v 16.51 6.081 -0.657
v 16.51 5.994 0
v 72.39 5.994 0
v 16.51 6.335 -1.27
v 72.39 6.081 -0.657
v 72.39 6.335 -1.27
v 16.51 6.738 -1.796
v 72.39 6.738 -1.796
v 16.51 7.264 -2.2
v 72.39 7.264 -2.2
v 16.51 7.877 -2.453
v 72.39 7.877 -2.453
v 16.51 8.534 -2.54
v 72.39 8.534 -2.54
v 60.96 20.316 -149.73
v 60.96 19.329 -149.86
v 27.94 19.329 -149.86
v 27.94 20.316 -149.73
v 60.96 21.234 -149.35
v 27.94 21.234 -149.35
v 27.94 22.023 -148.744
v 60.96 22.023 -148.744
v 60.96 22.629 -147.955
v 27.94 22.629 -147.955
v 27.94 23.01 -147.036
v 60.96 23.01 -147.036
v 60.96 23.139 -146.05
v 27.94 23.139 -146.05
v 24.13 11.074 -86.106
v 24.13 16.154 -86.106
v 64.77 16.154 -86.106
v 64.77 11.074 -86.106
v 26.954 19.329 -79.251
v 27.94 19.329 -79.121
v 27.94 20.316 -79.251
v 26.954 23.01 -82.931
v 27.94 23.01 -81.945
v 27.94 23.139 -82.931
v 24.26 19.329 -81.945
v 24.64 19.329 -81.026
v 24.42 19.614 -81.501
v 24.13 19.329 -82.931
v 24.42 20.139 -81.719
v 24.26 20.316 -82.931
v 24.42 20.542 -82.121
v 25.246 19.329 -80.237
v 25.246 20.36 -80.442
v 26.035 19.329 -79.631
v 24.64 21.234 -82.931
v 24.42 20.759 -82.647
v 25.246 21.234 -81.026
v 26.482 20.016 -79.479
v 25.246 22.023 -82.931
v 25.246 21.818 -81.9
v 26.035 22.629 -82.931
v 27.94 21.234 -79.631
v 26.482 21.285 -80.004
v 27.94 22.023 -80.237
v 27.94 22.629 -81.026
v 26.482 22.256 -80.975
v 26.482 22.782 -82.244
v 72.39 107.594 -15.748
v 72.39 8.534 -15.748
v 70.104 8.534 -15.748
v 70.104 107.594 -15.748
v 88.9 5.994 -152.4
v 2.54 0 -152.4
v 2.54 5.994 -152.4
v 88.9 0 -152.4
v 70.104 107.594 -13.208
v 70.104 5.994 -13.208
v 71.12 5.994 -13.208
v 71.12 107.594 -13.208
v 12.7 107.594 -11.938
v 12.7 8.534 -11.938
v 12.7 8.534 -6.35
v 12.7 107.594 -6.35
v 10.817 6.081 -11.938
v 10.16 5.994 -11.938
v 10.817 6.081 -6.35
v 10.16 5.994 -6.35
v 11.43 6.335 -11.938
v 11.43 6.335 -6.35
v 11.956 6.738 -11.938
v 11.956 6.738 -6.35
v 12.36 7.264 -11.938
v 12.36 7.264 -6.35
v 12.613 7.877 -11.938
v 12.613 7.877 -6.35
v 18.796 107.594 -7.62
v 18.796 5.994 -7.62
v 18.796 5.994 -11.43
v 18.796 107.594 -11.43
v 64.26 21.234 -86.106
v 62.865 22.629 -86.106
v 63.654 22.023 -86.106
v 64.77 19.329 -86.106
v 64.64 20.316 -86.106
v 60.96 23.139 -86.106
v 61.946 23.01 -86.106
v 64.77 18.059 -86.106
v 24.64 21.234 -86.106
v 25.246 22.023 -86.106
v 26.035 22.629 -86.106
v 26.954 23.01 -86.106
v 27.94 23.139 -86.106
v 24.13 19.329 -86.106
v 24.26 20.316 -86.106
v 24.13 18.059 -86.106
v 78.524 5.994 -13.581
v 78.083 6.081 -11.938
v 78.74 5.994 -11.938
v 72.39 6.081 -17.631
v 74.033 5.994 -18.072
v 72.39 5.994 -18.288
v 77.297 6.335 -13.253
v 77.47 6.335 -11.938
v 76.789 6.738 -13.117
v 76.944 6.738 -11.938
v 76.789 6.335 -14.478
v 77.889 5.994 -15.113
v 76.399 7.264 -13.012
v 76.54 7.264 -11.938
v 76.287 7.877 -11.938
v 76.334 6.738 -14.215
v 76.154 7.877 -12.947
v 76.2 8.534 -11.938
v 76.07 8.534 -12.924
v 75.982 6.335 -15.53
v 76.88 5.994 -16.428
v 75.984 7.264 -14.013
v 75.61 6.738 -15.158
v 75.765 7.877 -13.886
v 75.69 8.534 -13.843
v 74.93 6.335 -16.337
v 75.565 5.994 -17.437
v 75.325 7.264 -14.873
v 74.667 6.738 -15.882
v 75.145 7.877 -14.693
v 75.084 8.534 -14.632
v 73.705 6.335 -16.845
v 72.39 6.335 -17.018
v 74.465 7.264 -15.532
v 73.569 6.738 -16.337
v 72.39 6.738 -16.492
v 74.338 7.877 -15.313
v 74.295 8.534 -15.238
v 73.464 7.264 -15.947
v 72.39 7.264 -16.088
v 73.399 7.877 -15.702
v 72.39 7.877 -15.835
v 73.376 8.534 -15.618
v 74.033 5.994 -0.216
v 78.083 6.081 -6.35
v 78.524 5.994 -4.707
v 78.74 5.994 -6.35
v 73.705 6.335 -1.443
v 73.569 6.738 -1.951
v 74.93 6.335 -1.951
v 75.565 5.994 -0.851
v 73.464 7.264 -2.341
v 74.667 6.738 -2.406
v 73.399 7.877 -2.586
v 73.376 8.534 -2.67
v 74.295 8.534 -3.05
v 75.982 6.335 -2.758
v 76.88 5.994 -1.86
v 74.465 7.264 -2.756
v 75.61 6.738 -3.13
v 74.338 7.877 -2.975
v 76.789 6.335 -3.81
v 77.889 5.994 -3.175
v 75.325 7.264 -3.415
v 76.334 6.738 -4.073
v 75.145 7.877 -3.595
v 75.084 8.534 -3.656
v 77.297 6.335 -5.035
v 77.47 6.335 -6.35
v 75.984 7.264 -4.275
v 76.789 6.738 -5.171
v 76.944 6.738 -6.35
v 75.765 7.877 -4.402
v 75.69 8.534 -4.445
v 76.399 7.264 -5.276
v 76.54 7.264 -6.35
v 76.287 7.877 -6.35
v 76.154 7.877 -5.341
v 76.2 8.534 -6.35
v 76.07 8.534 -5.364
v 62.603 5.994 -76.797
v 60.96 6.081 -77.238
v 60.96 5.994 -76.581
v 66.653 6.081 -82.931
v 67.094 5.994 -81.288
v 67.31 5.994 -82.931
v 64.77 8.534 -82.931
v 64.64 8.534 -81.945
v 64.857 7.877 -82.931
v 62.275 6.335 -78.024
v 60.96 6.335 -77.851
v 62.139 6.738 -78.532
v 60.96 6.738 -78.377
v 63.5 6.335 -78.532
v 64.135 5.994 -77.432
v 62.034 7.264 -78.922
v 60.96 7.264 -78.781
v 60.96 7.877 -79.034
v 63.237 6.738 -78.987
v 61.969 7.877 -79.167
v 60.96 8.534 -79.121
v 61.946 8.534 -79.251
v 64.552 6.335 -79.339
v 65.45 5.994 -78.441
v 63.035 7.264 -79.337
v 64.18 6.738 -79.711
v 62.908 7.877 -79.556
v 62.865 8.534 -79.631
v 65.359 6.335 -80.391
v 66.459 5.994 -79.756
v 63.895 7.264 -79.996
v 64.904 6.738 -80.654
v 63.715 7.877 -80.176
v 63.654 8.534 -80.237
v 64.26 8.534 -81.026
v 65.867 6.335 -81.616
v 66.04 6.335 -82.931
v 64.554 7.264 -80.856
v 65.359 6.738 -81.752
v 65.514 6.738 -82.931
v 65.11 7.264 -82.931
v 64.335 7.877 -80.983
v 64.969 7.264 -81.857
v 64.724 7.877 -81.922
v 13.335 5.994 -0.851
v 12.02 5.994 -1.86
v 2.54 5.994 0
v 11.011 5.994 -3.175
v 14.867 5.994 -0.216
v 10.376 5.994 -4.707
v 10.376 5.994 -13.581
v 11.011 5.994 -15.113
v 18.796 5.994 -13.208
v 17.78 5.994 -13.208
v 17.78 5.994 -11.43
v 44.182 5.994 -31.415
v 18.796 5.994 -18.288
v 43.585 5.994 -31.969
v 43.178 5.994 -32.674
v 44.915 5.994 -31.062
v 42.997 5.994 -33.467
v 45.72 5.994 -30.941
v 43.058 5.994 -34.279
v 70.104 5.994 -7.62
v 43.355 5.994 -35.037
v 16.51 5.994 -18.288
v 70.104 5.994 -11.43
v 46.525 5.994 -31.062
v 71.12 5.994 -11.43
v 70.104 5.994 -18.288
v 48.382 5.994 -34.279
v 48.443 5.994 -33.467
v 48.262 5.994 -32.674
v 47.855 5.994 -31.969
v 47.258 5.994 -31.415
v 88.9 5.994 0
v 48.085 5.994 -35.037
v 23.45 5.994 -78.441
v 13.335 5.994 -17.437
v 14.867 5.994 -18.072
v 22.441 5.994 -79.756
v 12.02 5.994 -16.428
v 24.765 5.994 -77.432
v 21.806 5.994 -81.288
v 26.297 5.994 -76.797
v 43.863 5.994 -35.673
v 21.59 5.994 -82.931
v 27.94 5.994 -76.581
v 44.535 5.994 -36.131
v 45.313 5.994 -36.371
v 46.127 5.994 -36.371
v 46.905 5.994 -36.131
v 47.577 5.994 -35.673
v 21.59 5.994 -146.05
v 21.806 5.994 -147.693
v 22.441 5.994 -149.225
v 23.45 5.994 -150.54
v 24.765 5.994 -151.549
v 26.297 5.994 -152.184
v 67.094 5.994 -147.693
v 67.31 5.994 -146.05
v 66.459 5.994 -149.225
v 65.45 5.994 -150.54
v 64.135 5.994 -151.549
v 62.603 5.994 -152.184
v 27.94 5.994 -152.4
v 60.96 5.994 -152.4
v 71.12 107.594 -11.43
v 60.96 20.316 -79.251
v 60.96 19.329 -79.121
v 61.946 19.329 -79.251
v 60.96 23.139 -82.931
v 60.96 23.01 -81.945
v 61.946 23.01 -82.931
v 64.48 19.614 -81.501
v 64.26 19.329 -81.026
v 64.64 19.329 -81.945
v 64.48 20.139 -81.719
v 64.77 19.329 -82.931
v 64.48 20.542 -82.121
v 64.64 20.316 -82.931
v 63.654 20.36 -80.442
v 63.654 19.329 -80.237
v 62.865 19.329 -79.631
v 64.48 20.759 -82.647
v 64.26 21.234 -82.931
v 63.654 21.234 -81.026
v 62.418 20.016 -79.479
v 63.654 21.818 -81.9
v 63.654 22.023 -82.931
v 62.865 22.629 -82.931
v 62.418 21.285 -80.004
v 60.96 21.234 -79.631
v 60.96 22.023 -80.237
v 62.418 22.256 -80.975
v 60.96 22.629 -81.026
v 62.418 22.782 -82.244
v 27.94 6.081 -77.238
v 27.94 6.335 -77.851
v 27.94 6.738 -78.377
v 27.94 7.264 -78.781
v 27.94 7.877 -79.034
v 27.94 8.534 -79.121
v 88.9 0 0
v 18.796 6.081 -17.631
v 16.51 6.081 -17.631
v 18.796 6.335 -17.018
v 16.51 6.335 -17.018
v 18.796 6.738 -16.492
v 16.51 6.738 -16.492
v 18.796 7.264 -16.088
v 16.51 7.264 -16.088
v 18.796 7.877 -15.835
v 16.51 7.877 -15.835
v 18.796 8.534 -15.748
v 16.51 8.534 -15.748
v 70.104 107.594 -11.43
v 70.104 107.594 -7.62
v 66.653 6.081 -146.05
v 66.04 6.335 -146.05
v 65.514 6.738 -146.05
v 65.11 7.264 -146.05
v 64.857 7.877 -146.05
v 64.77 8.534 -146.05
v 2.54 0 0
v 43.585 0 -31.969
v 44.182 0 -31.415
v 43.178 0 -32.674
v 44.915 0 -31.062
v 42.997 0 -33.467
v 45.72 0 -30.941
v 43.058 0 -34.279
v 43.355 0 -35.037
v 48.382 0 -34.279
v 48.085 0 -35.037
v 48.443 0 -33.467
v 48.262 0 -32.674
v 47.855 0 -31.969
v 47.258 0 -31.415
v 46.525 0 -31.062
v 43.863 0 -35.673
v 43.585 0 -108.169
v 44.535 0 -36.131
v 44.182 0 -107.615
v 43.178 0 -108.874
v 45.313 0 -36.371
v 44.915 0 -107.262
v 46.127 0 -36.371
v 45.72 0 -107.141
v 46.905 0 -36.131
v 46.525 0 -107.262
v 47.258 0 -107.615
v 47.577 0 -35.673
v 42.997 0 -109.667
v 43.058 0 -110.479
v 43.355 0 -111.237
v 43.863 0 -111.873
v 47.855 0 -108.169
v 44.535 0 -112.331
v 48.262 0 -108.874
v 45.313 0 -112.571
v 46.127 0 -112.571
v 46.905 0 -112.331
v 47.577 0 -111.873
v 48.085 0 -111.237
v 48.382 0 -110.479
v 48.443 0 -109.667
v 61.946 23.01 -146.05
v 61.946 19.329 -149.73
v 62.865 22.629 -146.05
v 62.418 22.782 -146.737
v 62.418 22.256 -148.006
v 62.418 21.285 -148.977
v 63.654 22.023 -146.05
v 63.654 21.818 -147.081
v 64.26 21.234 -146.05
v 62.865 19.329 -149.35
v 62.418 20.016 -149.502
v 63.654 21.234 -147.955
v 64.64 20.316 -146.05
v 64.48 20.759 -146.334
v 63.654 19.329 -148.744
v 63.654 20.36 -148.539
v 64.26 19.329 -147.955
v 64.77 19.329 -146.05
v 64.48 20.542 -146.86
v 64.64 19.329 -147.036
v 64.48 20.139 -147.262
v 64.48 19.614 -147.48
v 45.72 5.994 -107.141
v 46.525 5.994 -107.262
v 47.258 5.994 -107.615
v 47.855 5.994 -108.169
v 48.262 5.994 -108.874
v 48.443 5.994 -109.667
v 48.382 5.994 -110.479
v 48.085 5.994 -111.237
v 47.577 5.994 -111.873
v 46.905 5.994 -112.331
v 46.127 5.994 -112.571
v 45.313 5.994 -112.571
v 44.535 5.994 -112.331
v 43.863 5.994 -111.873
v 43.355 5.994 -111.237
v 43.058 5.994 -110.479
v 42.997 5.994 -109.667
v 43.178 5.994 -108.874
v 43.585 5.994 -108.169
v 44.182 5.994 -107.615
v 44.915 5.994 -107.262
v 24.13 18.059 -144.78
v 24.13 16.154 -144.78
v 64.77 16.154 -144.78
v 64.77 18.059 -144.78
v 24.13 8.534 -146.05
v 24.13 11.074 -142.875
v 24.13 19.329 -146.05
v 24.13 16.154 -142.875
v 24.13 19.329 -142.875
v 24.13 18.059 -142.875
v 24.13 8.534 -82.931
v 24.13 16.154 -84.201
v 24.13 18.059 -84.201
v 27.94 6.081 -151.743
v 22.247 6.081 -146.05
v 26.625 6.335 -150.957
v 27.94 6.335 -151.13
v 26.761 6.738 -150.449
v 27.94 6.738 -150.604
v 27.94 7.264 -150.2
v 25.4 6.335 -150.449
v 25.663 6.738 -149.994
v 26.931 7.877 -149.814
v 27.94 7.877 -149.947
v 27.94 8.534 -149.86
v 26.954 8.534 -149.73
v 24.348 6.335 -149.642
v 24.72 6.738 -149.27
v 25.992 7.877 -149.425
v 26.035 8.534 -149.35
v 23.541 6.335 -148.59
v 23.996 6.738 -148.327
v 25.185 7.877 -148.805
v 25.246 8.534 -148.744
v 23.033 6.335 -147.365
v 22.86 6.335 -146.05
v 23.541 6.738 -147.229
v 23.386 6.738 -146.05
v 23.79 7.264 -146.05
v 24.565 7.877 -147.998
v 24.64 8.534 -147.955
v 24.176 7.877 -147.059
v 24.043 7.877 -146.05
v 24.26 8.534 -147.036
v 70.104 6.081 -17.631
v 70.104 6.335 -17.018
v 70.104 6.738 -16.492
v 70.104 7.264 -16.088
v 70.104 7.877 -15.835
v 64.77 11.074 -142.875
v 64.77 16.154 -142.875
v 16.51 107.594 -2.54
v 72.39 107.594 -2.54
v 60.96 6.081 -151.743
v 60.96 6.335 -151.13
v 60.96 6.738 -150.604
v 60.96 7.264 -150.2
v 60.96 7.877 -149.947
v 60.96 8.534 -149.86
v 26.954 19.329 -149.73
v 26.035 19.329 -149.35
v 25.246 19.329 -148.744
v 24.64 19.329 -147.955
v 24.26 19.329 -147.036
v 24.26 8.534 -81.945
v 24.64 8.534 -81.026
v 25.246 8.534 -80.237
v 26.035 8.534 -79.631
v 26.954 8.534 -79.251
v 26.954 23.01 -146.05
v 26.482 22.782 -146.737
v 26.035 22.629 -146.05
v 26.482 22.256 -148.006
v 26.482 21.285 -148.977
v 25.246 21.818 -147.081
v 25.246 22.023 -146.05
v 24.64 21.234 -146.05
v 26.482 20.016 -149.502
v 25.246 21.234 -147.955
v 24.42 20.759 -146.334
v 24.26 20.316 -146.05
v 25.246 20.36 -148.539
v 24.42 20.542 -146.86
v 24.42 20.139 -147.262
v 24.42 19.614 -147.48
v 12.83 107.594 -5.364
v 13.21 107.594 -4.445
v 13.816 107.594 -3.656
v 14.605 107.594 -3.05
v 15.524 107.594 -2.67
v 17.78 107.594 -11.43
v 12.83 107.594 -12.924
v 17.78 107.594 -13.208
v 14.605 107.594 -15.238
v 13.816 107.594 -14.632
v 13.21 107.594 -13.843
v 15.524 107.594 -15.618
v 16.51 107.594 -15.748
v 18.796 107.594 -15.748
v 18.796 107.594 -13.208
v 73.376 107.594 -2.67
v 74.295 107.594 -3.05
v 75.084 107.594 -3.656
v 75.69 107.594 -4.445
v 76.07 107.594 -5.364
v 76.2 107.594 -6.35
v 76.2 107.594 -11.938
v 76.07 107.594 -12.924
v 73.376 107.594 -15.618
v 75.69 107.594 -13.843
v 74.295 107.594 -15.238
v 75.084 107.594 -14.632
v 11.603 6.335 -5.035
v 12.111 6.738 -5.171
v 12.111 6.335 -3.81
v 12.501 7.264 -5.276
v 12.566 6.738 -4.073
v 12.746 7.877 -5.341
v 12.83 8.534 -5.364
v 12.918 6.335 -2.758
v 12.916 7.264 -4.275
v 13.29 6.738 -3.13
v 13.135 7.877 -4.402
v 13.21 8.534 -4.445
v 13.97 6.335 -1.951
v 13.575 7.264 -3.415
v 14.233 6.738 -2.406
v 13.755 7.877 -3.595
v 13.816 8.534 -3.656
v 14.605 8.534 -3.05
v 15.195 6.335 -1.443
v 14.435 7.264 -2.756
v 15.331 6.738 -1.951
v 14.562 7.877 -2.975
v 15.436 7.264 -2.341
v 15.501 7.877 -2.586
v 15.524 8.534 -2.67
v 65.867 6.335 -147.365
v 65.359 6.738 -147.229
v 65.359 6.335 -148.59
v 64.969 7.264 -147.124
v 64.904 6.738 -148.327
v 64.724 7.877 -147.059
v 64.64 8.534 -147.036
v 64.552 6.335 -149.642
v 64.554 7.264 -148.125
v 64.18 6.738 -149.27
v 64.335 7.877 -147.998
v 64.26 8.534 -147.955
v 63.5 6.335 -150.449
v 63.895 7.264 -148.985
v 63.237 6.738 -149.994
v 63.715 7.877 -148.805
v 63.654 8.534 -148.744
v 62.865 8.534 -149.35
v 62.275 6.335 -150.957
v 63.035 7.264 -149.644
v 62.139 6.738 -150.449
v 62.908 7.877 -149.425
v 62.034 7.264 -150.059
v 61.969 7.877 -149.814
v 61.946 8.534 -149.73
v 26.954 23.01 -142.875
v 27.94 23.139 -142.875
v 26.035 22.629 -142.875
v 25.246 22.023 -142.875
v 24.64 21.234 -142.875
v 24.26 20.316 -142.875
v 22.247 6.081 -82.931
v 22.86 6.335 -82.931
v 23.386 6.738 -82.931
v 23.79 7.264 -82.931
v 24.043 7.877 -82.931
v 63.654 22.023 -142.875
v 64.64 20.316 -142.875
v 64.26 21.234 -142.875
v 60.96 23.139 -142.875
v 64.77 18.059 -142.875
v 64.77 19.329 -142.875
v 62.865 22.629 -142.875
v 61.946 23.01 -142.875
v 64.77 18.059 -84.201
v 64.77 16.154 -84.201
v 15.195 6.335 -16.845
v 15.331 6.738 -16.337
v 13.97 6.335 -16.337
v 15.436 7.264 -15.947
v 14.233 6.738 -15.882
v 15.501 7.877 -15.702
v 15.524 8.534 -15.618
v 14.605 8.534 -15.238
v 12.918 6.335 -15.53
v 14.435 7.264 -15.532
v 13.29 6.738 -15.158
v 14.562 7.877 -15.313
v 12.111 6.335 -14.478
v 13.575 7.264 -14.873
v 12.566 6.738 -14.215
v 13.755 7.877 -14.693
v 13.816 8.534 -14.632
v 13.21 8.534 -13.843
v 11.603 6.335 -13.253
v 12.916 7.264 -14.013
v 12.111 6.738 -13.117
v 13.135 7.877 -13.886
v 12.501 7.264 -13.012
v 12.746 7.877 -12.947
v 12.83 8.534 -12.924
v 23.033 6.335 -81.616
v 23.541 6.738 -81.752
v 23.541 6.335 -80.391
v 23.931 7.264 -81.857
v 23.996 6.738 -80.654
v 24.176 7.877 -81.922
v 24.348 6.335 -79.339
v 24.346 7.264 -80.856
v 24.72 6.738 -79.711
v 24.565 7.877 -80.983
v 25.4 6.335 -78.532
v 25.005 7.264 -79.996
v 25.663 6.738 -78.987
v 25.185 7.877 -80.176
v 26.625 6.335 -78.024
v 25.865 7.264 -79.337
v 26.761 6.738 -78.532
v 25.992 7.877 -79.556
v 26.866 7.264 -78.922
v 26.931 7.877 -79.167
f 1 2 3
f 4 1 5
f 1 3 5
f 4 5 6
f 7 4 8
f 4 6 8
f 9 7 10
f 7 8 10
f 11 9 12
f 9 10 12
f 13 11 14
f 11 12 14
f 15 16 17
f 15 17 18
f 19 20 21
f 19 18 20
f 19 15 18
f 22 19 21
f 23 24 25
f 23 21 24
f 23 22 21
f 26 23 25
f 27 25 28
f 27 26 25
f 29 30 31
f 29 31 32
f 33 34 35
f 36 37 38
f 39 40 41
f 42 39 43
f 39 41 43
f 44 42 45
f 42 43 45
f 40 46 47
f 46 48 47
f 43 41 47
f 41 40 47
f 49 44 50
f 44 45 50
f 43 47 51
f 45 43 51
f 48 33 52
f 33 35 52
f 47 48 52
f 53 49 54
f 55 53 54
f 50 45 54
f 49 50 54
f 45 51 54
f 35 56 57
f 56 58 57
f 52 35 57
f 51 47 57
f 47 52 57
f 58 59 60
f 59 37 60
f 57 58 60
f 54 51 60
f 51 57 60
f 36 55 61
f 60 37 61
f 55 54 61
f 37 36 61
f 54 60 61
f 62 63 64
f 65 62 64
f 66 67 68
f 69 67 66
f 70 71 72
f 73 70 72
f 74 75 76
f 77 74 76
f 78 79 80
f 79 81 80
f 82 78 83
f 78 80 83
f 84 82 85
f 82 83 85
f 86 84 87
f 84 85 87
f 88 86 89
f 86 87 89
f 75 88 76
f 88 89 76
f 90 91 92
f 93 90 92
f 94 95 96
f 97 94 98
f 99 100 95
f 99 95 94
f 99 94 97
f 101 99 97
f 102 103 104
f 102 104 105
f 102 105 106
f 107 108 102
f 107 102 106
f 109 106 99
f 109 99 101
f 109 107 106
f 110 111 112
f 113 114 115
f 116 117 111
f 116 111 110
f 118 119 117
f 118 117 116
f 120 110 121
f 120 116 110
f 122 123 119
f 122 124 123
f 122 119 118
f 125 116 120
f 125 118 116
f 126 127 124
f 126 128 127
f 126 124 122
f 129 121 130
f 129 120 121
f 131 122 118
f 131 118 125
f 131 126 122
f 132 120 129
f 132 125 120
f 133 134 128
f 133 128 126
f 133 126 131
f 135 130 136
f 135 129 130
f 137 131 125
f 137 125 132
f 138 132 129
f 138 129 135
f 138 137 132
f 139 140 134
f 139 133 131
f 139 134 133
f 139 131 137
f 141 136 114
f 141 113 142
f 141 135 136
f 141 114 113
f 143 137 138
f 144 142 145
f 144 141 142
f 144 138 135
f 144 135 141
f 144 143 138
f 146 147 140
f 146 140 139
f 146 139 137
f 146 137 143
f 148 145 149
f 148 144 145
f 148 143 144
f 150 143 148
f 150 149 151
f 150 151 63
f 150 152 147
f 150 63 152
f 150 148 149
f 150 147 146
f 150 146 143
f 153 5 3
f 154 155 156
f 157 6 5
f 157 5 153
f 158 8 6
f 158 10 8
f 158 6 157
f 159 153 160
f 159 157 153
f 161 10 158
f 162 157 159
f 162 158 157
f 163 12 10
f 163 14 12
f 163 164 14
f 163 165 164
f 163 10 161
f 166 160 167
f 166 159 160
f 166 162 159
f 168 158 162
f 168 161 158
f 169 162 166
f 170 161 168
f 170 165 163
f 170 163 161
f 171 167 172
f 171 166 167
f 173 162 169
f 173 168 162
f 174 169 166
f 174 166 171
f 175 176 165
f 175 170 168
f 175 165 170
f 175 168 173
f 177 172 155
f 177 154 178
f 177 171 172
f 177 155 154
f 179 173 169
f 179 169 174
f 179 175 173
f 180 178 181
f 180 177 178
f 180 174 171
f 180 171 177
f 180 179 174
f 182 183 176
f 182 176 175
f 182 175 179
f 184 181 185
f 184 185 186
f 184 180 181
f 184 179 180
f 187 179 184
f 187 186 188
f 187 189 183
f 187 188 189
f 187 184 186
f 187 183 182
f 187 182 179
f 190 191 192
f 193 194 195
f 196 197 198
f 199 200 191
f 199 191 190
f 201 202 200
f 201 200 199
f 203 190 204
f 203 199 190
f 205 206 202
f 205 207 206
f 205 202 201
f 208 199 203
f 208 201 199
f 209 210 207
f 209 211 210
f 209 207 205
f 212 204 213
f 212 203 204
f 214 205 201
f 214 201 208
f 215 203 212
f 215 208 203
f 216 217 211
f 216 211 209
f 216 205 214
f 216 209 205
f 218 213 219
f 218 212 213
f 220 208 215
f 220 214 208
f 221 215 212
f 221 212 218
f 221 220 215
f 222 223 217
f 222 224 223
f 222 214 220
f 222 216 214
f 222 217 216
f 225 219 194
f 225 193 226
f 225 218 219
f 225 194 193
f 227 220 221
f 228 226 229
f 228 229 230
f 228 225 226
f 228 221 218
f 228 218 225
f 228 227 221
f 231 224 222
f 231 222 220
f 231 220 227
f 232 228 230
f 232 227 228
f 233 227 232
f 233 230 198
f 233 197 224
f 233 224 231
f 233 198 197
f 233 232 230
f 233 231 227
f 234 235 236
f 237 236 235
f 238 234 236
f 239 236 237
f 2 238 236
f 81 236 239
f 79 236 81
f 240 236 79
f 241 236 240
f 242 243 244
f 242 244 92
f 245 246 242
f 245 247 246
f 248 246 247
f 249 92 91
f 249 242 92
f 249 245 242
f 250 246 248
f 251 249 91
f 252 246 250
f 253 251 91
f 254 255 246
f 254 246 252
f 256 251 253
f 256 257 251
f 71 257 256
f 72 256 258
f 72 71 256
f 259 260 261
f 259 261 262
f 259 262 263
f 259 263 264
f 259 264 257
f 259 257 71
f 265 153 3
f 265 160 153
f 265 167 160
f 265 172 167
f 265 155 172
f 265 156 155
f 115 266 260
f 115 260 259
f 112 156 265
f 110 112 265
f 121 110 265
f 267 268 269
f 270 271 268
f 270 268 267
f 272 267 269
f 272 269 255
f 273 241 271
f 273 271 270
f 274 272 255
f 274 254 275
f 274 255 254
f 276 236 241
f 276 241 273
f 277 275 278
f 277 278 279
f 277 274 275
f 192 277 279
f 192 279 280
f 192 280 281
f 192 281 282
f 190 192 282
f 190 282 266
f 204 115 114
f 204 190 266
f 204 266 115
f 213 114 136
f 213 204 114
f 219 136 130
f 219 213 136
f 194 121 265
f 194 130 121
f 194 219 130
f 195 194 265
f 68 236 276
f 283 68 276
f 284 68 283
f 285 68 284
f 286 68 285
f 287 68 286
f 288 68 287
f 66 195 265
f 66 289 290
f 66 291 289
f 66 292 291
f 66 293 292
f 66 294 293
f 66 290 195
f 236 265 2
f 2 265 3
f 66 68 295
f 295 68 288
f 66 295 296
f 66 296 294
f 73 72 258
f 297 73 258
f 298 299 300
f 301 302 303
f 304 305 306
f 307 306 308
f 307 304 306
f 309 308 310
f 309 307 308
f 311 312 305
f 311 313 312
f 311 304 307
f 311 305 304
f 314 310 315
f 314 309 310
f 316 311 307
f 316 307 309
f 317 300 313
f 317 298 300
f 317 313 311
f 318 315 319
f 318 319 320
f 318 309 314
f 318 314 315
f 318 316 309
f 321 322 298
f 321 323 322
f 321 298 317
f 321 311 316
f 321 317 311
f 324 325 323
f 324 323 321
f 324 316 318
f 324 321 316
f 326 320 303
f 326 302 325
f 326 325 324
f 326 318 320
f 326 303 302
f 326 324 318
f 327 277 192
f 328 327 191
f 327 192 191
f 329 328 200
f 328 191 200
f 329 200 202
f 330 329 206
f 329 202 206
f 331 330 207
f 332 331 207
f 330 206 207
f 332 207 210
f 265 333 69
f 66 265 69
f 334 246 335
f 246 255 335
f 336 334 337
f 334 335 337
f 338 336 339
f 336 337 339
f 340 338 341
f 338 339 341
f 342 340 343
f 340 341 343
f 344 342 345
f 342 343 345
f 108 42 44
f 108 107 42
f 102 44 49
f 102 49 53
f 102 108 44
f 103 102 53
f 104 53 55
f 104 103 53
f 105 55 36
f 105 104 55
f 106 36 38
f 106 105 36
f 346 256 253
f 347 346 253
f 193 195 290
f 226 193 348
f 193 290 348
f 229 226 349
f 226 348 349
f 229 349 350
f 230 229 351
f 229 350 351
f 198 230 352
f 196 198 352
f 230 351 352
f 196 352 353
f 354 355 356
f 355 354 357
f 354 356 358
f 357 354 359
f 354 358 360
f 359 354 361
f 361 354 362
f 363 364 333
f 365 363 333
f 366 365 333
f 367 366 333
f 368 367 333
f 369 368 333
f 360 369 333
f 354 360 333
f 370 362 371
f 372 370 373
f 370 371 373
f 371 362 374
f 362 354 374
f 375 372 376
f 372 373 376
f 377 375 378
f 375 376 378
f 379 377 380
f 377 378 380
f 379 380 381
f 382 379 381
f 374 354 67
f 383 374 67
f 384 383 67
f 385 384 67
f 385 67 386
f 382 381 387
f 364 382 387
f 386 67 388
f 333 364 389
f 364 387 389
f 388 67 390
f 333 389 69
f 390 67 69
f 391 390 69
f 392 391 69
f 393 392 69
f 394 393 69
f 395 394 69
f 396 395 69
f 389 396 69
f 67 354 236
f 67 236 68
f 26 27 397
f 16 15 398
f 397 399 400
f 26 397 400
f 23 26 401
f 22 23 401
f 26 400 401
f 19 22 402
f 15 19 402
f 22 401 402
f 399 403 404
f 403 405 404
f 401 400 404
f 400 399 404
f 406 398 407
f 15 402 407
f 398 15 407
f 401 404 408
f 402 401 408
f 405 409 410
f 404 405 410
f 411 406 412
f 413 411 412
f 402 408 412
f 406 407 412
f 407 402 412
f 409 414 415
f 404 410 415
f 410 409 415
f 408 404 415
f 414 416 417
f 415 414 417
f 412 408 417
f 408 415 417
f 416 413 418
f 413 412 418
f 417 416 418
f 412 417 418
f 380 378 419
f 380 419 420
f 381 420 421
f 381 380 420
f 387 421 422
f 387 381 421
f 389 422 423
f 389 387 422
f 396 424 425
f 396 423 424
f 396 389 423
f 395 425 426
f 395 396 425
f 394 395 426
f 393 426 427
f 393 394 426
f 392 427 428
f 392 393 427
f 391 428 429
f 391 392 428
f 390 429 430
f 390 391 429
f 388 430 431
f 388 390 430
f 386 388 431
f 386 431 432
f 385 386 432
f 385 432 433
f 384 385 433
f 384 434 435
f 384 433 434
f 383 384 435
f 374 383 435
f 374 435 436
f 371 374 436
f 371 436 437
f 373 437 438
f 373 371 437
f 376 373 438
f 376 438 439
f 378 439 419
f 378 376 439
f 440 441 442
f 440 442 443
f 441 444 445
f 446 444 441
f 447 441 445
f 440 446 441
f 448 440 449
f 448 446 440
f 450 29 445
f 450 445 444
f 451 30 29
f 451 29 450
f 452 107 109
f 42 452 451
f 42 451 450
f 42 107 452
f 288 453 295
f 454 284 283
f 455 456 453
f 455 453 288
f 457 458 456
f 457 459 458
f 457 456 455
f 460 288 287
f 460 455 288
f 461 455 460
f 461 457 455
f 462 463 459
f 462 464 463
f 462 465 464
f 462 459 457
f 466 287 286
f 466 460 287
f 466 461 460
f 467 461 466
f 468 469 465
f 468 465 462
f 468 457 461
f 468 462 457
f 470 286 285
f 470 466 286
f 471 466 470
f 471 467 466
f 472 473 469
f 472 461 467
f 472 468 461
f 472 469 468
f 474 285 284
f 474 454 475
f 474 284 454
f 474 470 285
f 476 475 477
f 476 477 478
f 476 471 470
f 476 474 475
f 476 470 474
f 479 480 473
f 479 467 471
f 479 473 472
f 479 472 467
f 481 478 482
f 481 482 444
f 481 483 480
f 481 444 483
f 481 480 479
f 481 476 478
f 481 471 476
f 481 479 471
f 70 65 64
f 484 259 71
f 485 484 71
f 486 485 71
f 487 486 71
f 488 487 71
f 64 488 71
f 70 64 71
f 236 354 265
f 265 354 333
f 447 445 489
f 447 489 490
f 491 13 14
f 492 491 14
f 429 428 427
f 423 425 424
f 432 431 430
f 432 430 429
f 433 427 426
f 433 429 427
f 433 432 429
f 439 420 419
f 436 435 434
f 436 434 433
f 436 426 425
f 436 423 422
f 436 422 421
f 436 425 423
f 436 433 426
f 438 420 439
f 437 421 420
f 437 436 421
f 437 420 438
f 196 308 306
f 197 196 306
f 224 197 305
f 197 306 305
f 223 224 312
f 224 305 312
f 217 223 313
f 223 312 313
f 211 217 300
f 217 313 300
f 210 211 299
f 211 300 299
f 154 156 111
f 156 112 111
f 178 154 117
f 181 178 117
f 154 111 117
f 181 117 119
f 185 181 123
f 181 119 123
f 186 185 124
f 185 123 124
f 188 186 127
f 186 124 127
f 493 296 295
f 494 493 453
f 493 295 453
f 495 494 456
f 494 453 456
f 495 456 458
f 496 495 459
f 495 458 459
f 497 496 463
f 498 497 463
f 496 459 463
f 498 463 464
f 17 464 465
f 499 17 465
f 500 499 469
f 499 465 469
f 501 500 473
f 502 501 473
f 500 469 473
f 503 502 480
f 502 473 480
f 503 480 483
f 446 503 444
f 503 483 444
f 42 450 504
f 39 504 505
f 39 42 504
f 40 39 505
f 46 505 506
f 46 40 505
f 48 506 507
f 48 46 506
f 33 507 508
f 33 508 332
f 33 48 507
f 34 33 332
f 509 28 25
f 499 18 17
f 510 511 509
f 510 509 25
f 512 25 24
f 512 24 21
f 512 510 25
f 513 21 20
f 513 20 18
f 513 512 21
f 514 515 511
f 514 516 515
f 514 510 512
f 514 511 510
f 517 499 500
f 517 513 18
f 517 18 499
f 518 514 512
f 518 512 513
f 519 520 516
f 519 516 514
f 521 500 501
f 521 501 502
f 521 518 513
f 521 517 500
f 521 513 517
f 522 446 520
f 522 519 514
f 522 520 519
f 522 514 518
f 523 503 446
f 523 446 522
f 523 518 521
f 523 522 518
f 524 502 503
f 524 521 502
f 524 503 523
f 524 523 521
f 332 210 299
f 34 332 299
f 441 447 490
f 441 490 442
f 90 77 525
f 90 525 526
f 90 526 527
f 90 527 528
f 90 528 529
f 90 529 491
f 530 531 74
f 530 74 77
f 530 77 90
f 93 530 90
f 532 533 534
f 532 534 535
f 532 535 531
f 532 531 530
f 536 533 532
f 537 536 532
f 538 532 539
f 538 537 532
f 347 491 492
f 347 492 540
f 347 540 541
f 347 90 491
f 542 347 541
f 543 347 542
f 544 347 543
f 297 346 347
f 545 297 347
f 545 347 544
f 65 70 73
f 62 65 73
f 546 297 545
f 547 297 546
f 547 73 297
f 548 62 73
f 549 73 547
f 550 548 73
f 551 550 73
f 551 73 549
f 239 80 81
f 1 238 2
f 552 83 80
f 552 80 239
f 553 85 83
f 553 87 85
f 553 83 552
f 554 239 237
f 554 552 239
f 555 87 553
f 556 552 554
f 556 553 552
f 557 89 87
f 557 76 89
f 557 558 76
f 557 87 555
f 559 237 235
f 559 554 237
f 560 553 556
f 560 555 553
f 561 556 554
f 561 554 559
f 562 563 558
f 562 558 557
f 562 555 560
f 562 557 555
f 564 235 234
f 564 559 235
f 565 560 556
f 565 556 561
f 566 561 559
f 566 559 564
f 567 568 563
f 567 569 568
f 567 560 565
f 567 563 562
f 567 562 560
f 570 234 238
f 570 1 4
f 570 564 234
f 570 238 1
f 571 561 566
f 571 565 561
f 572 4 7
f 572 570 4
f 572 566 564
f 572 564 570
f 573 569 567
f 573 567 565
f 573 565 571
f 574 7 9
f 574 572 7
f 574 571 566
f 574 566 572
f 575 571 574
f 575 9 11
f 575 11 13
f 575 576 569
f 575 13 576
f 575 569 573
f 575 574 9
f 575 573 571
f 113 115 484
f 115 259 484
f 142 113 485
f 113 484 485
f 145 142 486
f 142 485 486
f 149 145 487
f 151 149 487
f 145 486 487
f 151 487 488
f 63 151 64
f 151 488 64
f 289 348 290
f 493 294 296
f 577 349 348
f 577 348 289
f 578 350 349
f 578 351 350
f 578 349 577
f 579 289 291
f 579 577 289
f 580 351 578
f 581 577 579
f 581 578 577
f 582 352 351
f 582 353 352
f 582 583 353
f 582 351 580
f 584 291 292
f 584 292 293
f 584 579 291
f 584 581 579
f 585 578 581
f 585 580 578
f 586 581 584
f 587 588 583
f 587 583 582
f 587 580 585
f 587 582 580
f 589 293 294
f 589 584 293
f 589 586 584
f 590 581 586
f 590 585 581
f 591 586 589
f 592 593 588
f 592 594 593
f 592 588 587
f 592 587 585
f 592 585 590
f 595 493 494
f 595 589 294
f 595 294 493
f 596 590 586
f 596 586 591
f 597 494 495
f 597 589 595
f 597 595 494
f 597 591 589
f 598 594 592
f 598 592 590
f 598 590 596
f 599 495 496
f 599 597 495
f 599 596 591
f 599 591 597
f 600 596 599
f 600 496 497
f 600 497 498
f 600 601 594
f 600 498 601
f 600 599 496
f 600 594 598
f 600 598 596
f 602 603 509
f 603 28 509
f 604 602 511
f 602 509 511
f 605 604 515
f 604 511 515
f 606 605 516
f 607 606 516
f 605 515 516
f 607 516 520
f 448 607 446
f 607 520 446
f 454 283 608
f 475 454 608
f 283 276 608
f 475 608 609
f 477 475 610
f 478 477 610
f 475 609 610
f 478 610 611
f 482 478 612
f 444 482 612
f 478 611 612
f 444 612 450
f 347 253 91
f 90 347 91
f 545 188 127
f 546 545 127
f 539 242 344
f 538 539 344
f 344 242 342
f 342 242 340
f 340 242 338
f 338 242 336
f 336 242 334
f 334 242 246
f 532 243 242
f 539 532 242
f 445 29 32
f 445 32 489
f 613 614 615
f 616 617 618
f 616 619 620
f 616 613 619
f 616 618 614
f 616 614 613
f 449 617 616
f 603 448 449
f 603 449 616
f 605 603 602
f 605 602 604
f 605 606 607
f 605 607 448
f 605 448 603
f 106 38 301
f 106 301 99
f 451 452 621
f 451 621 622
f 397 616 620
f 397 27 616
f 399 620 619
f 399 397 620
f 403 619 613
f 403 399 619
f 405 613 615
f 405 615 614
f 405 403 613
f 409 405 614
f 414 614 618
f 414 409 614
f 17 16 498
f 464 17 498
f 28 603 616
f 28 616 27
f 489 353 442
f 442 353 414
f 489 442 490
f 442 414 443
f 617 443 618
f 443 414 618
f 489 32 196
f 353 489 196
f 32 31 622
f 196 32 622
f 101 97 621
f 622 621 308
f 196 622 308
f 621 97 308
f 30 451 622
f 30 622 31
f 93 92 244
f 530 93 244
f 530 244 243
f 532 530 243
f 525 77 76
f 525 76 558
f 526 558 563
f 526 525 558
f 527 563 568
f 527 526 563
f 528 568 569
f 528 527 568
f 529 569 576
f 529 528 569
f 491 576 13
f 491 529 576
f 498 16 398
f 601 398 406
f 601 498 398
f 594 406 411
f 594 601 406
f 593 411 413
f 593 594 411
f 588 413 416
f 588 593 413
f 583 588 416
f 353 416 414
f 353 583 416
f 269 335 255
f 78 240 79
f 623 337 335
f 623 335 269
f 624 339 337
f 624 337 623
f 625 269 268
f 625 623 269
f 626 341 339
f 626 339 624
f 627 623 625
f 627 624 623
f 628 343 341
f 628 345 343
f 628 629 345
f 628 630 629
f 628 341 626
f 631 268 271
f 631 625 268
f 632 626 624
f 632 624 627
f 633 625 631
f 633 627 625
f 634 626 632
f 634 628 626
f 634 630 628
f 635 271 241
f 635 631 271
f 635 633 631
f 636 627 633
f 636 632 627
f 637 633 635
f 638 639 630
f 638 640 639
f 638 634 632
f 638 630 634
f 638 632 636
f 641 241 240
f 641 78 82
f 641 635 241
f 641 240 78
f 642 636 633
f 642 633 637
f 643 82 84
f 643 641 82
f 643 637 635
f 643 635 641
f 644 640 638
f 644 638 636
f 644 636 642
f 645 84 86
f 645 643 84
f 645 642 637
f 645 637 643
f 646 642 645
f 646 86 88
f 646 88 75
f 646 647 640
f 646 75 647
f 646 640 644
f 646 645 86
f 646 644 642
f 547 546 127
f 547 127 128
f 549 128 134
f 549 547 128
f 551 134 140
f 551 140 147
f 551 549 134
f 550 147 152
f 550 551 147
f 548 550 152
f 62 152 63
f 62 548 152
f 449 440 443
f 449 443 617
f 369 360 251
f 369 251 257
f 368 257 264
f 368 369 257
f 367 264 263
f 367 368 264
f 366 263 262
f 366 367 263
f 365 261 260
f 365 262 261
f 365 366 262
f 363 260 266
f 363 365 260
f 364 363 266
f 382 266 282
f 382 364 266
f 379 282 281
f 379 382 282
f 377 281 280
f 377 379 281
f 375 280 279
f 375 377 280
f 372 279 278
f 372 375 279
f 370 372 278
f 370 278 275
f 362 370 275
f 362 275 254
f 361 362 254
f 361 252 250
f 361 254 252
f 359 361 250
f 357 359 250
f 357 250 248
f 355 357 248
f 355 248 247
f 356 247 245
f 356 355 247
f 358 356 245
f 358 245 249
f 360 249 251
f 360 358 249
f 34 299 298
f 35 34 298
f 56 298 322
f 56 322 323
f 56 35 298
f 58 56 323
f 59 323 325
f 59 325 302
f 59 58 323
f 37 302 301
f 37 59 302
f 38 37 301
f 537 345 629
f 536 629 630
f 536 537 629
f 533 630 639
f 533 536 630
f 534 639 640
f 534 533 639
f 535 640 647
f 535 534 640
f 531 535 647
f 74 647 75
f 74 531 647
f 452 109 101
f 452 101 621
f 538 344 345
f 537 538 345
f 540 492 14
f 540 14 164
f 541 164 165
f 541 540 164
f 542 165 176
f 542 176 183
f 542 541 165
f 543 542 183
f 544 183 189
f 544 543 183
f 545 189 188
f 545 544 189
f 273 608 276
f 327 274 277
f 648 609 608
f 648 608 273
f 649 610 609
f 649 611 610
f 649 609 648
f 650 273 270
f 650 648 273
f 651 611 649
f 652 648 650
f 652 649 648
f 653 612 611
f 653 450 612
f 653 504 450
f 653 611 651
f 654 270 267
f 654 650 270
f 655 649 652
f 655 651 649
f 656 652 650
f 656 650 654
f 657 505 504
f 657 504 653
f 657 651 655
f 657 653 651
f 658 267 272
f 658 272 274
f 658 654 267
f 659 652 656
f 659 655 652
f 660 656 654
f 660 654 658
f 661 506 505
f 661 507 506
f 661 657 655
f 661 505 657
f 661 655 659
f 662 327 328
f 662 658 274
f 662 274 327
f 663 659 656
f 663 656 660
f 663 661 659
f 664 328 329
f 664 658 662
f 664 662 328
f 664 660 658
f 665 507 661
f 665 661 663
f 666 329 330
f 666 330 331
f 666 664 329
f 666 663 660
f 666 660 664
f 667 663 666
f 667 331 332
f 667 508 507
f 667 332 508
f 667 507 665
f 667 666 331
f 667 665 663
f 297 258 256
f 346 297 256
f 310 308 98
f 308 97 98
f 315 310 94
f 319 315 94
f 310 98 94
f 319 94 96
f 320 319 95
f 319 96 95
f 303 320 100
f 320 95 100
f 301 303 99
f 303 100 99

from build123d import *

# Parameters (mm, degrees)
SKETCH2_W               = 88.9
SKETCH2_H               = 152.4
BOSS_EXTRUDE1_DEPTH     = 5.9944
CUT_EXTRUDE2_DEPTH      = 177.535840076
CUT_EXTRUDE2_DEPTH_BACK = 177.535840076
SKETCH4_R               = 2.7305
BOSS_EXTRUDE2_DEPTH     = 101.6
FILLET1_R               = 3.81
FILLET2_R               = 2.54
BOSS_EXTRUDE3_DEPTH     = 20.32
FILLET3_R               = 3.81
FILLET6_R               = 3.81
FILLET7_R               = 2.54
CUT_EXTRUDE3_DEPTH      = 204.596488182
CUT_EXTRUDE3_DEPTH_BACK = 204.596488182
SKETCH7_W               = 2.54
SKETCH7_H               = 152.4


with BuildPart() as part:
    # Sketch2 → Boss-Extrude1 (new body)
    with BuildSketch(Plane(origin=(0, 0, 0), x_dir=(1, 0, 0), z_dir=(0, 1, 0))):
        with Locations((44.45, 76.2)):
            Rectangle(SKETCH2_W, SKETCH2_H)
    extrude(amount=BOSS_EXTRUDE1_DEPTH)

    # Sketch4 → Cut-Extrude2 (cut, two sides: drawn at the far end of the back side and taken through both)
    with BuildSketch(Plane(origin=(0, 5.9944, 0), x_dir=(1, 0, 0), z_dir=(0, 1, 0)).offset(-CUT_EXTRUDE2_DEPTH_BACK)):
        with Locations(Location((45.72, 109.871331367, 0), (0, 0, 270))):
            Circle(SKETCH4_R)
        with Locations(Location((45.72, 33.671331367, 0), (0, 0, 270))):
            Circle(SKETCH4_R)
    extrude(amount=CUT_EXTRUDE2_DEPTH + CUT_EXTRUDE2_DEPTH_BACK, mode=Mode.SUBTRACT)

    # Sketch5 → Boss-Extrude2 (add)
    with BuildSketch(Plane(origin=(0, 5.9944, 0), x_dir=(1, 0, 0), z_dir=(0, 1, 0))):
        Polygon((18.796, 15.748), (12.7, 15.748), (12.7, 2.54), (76.2, 2.54), (76.2, 15.748), (70.104, 15.748), (70.104, 13.208), (71.12, 13.208), (71.12, 11.43), (70.104, 11.43), (70.104, 7.62), (18.796, 7.62), (18.796, 11.43), (17.78, 11.43), (17.78, 13.208), (18.796, 13.208), align=None)
    extrude(amount=BOSS_EXTRUDE2_DEPTH)

    # Fillet1
    fillet1_edges = [part.edges().sort_by_distance(p)[0] for p in [
        (12.7, 56.7944, -15.748),
        (12.7, 56.7944, -2.54),
        (76.2, 56.7944, -2.54),
        (76.2, 56.7944, -15.748),
    ]]
    fillet(fillet1_edges, radius=FILLET1_R)

    # Fillet2
    fillet2_edges = [part.edges().sort_by_distance(p)[0] for p in [
        (71.247, 5.9944, -15.748),
        (44.45, 5.9944, -2.54),
        (12.7, 5.9944, -9.144),
        (17.653, 5.9944, -15.748),
        (76.2, 5.9944, -9.144),
        (13.815923164, 5.9944, -3.655923164),
        (13.815923164, 5.9944, -14.632076836),
        (75.084076836, 5.9944, -3.655923164),
        (75.084076836, 5.9944, -14.632076836),
    ]]
    fillet(fillet2_edges, radius=FILLET2_R - 0.0001)  # a hair under: the kernel refuses the full size

    # Sketch6 → Boss-Extrude3 (add, symmetric)
    with BuildSketch(Plane.ZY.offset(-44.45)):
        Polygon((-149.86, 5.9944), (-79.121, 5.9944), (-79.121, 23.1394), (-86.106, 23.1394), (-86.106, 18.0594), (-84.201, 18.0594), (-84.201, 16.1544), (-86.106, 16.1544), (-86.106, 11.0744), (-142.875, 11.0744), (-142.875, 16.1544), (-144.78, 16.1544), (-144.78, 18.0594), (-142.875, 18.0594), (-142.875, 23.1394), (-149.86, 23.1394), align=None)
    extrude(amount=BOSS_EXTRUDE3_DEPTH, both=True)

    # Fillet3
    fillet3_edges = [part.edges().sort_by_distance(p)[0] for p in [
        (44.45, 23.1394, -149.86),
        (44.45, 23.1394, -79.121),
    ]]
    fillet(fillet3_edges, radius=FILLET3_R)

    # Fillet6
    fillet6_edges = [part.edges().sort_by_distance(p)[0] for p in [
        (24.13, 12.6619, -149.86),
        (64.77, 12.6619, -79.121),
        (24.13, 23.1394, -84.5185),
        (24.13, 12.6619, -79.121),
        (64.77, 23.1394, -84.5185),
        (64.77, 12.6619, -149.86),
        (64.77, 23.1394, -144.4625),
        (64.77, 22.023476836, -148.744076836),
        (64.77, 22.023476836, -80.236923164),
        (24.13, 23.1394, -144.4625),
        (24.13, 22.023476836, -148.744076836),
        (24.13, 22.023476836, -80.236923164),
    ]]
    fillet(fillet6_edges, radius=FILLET6_R)

    # Fillet7
    fillet7_edges = [part.edges().sort_by_distance(p)[0] for p in [
        (24.13, 5.9944, -114.4905),
        (64.77, 5.9944, -114.4905),
        (44.45, 5.9944, -79.121),
        (44.45, 5.9944, -149.86),
        (25.245923164, 5.9944, -80.236923164),
        (63.654076836, 5.9944, -80.236923164),
        (63.654076836, 5.9944, -148.744076836),
        (25.245923164, 5.9944, -148.744076836),
    ]]
    fillet(fillet7_edges, radius=FILLET7_R - 0.0001)  # a hair under: the kernel refuses the full size

    # Sketch7 → Cut-Extrude3 (cut, two sides: drawn at the far end of the back side and taken through both)
    with BuildSketch(Plane(origin=(0, 5.9944, 0), x_dir=(1, 0, 0), z_dir=(0, 1, 0)).offset(-CUT_EXTRUDE3_DEPTH_BACK)):
        with Locations((1.27, 76.2)):
            Rectangle(SKETCH7_W, SKETCH7_H)
    extrude(amount=CUT_EXTRUDE3_DEPTH + CUT_EXTRUDE3_DEPTH_BACK, mode=Mode.SUBTRACT)


solid = part.part
